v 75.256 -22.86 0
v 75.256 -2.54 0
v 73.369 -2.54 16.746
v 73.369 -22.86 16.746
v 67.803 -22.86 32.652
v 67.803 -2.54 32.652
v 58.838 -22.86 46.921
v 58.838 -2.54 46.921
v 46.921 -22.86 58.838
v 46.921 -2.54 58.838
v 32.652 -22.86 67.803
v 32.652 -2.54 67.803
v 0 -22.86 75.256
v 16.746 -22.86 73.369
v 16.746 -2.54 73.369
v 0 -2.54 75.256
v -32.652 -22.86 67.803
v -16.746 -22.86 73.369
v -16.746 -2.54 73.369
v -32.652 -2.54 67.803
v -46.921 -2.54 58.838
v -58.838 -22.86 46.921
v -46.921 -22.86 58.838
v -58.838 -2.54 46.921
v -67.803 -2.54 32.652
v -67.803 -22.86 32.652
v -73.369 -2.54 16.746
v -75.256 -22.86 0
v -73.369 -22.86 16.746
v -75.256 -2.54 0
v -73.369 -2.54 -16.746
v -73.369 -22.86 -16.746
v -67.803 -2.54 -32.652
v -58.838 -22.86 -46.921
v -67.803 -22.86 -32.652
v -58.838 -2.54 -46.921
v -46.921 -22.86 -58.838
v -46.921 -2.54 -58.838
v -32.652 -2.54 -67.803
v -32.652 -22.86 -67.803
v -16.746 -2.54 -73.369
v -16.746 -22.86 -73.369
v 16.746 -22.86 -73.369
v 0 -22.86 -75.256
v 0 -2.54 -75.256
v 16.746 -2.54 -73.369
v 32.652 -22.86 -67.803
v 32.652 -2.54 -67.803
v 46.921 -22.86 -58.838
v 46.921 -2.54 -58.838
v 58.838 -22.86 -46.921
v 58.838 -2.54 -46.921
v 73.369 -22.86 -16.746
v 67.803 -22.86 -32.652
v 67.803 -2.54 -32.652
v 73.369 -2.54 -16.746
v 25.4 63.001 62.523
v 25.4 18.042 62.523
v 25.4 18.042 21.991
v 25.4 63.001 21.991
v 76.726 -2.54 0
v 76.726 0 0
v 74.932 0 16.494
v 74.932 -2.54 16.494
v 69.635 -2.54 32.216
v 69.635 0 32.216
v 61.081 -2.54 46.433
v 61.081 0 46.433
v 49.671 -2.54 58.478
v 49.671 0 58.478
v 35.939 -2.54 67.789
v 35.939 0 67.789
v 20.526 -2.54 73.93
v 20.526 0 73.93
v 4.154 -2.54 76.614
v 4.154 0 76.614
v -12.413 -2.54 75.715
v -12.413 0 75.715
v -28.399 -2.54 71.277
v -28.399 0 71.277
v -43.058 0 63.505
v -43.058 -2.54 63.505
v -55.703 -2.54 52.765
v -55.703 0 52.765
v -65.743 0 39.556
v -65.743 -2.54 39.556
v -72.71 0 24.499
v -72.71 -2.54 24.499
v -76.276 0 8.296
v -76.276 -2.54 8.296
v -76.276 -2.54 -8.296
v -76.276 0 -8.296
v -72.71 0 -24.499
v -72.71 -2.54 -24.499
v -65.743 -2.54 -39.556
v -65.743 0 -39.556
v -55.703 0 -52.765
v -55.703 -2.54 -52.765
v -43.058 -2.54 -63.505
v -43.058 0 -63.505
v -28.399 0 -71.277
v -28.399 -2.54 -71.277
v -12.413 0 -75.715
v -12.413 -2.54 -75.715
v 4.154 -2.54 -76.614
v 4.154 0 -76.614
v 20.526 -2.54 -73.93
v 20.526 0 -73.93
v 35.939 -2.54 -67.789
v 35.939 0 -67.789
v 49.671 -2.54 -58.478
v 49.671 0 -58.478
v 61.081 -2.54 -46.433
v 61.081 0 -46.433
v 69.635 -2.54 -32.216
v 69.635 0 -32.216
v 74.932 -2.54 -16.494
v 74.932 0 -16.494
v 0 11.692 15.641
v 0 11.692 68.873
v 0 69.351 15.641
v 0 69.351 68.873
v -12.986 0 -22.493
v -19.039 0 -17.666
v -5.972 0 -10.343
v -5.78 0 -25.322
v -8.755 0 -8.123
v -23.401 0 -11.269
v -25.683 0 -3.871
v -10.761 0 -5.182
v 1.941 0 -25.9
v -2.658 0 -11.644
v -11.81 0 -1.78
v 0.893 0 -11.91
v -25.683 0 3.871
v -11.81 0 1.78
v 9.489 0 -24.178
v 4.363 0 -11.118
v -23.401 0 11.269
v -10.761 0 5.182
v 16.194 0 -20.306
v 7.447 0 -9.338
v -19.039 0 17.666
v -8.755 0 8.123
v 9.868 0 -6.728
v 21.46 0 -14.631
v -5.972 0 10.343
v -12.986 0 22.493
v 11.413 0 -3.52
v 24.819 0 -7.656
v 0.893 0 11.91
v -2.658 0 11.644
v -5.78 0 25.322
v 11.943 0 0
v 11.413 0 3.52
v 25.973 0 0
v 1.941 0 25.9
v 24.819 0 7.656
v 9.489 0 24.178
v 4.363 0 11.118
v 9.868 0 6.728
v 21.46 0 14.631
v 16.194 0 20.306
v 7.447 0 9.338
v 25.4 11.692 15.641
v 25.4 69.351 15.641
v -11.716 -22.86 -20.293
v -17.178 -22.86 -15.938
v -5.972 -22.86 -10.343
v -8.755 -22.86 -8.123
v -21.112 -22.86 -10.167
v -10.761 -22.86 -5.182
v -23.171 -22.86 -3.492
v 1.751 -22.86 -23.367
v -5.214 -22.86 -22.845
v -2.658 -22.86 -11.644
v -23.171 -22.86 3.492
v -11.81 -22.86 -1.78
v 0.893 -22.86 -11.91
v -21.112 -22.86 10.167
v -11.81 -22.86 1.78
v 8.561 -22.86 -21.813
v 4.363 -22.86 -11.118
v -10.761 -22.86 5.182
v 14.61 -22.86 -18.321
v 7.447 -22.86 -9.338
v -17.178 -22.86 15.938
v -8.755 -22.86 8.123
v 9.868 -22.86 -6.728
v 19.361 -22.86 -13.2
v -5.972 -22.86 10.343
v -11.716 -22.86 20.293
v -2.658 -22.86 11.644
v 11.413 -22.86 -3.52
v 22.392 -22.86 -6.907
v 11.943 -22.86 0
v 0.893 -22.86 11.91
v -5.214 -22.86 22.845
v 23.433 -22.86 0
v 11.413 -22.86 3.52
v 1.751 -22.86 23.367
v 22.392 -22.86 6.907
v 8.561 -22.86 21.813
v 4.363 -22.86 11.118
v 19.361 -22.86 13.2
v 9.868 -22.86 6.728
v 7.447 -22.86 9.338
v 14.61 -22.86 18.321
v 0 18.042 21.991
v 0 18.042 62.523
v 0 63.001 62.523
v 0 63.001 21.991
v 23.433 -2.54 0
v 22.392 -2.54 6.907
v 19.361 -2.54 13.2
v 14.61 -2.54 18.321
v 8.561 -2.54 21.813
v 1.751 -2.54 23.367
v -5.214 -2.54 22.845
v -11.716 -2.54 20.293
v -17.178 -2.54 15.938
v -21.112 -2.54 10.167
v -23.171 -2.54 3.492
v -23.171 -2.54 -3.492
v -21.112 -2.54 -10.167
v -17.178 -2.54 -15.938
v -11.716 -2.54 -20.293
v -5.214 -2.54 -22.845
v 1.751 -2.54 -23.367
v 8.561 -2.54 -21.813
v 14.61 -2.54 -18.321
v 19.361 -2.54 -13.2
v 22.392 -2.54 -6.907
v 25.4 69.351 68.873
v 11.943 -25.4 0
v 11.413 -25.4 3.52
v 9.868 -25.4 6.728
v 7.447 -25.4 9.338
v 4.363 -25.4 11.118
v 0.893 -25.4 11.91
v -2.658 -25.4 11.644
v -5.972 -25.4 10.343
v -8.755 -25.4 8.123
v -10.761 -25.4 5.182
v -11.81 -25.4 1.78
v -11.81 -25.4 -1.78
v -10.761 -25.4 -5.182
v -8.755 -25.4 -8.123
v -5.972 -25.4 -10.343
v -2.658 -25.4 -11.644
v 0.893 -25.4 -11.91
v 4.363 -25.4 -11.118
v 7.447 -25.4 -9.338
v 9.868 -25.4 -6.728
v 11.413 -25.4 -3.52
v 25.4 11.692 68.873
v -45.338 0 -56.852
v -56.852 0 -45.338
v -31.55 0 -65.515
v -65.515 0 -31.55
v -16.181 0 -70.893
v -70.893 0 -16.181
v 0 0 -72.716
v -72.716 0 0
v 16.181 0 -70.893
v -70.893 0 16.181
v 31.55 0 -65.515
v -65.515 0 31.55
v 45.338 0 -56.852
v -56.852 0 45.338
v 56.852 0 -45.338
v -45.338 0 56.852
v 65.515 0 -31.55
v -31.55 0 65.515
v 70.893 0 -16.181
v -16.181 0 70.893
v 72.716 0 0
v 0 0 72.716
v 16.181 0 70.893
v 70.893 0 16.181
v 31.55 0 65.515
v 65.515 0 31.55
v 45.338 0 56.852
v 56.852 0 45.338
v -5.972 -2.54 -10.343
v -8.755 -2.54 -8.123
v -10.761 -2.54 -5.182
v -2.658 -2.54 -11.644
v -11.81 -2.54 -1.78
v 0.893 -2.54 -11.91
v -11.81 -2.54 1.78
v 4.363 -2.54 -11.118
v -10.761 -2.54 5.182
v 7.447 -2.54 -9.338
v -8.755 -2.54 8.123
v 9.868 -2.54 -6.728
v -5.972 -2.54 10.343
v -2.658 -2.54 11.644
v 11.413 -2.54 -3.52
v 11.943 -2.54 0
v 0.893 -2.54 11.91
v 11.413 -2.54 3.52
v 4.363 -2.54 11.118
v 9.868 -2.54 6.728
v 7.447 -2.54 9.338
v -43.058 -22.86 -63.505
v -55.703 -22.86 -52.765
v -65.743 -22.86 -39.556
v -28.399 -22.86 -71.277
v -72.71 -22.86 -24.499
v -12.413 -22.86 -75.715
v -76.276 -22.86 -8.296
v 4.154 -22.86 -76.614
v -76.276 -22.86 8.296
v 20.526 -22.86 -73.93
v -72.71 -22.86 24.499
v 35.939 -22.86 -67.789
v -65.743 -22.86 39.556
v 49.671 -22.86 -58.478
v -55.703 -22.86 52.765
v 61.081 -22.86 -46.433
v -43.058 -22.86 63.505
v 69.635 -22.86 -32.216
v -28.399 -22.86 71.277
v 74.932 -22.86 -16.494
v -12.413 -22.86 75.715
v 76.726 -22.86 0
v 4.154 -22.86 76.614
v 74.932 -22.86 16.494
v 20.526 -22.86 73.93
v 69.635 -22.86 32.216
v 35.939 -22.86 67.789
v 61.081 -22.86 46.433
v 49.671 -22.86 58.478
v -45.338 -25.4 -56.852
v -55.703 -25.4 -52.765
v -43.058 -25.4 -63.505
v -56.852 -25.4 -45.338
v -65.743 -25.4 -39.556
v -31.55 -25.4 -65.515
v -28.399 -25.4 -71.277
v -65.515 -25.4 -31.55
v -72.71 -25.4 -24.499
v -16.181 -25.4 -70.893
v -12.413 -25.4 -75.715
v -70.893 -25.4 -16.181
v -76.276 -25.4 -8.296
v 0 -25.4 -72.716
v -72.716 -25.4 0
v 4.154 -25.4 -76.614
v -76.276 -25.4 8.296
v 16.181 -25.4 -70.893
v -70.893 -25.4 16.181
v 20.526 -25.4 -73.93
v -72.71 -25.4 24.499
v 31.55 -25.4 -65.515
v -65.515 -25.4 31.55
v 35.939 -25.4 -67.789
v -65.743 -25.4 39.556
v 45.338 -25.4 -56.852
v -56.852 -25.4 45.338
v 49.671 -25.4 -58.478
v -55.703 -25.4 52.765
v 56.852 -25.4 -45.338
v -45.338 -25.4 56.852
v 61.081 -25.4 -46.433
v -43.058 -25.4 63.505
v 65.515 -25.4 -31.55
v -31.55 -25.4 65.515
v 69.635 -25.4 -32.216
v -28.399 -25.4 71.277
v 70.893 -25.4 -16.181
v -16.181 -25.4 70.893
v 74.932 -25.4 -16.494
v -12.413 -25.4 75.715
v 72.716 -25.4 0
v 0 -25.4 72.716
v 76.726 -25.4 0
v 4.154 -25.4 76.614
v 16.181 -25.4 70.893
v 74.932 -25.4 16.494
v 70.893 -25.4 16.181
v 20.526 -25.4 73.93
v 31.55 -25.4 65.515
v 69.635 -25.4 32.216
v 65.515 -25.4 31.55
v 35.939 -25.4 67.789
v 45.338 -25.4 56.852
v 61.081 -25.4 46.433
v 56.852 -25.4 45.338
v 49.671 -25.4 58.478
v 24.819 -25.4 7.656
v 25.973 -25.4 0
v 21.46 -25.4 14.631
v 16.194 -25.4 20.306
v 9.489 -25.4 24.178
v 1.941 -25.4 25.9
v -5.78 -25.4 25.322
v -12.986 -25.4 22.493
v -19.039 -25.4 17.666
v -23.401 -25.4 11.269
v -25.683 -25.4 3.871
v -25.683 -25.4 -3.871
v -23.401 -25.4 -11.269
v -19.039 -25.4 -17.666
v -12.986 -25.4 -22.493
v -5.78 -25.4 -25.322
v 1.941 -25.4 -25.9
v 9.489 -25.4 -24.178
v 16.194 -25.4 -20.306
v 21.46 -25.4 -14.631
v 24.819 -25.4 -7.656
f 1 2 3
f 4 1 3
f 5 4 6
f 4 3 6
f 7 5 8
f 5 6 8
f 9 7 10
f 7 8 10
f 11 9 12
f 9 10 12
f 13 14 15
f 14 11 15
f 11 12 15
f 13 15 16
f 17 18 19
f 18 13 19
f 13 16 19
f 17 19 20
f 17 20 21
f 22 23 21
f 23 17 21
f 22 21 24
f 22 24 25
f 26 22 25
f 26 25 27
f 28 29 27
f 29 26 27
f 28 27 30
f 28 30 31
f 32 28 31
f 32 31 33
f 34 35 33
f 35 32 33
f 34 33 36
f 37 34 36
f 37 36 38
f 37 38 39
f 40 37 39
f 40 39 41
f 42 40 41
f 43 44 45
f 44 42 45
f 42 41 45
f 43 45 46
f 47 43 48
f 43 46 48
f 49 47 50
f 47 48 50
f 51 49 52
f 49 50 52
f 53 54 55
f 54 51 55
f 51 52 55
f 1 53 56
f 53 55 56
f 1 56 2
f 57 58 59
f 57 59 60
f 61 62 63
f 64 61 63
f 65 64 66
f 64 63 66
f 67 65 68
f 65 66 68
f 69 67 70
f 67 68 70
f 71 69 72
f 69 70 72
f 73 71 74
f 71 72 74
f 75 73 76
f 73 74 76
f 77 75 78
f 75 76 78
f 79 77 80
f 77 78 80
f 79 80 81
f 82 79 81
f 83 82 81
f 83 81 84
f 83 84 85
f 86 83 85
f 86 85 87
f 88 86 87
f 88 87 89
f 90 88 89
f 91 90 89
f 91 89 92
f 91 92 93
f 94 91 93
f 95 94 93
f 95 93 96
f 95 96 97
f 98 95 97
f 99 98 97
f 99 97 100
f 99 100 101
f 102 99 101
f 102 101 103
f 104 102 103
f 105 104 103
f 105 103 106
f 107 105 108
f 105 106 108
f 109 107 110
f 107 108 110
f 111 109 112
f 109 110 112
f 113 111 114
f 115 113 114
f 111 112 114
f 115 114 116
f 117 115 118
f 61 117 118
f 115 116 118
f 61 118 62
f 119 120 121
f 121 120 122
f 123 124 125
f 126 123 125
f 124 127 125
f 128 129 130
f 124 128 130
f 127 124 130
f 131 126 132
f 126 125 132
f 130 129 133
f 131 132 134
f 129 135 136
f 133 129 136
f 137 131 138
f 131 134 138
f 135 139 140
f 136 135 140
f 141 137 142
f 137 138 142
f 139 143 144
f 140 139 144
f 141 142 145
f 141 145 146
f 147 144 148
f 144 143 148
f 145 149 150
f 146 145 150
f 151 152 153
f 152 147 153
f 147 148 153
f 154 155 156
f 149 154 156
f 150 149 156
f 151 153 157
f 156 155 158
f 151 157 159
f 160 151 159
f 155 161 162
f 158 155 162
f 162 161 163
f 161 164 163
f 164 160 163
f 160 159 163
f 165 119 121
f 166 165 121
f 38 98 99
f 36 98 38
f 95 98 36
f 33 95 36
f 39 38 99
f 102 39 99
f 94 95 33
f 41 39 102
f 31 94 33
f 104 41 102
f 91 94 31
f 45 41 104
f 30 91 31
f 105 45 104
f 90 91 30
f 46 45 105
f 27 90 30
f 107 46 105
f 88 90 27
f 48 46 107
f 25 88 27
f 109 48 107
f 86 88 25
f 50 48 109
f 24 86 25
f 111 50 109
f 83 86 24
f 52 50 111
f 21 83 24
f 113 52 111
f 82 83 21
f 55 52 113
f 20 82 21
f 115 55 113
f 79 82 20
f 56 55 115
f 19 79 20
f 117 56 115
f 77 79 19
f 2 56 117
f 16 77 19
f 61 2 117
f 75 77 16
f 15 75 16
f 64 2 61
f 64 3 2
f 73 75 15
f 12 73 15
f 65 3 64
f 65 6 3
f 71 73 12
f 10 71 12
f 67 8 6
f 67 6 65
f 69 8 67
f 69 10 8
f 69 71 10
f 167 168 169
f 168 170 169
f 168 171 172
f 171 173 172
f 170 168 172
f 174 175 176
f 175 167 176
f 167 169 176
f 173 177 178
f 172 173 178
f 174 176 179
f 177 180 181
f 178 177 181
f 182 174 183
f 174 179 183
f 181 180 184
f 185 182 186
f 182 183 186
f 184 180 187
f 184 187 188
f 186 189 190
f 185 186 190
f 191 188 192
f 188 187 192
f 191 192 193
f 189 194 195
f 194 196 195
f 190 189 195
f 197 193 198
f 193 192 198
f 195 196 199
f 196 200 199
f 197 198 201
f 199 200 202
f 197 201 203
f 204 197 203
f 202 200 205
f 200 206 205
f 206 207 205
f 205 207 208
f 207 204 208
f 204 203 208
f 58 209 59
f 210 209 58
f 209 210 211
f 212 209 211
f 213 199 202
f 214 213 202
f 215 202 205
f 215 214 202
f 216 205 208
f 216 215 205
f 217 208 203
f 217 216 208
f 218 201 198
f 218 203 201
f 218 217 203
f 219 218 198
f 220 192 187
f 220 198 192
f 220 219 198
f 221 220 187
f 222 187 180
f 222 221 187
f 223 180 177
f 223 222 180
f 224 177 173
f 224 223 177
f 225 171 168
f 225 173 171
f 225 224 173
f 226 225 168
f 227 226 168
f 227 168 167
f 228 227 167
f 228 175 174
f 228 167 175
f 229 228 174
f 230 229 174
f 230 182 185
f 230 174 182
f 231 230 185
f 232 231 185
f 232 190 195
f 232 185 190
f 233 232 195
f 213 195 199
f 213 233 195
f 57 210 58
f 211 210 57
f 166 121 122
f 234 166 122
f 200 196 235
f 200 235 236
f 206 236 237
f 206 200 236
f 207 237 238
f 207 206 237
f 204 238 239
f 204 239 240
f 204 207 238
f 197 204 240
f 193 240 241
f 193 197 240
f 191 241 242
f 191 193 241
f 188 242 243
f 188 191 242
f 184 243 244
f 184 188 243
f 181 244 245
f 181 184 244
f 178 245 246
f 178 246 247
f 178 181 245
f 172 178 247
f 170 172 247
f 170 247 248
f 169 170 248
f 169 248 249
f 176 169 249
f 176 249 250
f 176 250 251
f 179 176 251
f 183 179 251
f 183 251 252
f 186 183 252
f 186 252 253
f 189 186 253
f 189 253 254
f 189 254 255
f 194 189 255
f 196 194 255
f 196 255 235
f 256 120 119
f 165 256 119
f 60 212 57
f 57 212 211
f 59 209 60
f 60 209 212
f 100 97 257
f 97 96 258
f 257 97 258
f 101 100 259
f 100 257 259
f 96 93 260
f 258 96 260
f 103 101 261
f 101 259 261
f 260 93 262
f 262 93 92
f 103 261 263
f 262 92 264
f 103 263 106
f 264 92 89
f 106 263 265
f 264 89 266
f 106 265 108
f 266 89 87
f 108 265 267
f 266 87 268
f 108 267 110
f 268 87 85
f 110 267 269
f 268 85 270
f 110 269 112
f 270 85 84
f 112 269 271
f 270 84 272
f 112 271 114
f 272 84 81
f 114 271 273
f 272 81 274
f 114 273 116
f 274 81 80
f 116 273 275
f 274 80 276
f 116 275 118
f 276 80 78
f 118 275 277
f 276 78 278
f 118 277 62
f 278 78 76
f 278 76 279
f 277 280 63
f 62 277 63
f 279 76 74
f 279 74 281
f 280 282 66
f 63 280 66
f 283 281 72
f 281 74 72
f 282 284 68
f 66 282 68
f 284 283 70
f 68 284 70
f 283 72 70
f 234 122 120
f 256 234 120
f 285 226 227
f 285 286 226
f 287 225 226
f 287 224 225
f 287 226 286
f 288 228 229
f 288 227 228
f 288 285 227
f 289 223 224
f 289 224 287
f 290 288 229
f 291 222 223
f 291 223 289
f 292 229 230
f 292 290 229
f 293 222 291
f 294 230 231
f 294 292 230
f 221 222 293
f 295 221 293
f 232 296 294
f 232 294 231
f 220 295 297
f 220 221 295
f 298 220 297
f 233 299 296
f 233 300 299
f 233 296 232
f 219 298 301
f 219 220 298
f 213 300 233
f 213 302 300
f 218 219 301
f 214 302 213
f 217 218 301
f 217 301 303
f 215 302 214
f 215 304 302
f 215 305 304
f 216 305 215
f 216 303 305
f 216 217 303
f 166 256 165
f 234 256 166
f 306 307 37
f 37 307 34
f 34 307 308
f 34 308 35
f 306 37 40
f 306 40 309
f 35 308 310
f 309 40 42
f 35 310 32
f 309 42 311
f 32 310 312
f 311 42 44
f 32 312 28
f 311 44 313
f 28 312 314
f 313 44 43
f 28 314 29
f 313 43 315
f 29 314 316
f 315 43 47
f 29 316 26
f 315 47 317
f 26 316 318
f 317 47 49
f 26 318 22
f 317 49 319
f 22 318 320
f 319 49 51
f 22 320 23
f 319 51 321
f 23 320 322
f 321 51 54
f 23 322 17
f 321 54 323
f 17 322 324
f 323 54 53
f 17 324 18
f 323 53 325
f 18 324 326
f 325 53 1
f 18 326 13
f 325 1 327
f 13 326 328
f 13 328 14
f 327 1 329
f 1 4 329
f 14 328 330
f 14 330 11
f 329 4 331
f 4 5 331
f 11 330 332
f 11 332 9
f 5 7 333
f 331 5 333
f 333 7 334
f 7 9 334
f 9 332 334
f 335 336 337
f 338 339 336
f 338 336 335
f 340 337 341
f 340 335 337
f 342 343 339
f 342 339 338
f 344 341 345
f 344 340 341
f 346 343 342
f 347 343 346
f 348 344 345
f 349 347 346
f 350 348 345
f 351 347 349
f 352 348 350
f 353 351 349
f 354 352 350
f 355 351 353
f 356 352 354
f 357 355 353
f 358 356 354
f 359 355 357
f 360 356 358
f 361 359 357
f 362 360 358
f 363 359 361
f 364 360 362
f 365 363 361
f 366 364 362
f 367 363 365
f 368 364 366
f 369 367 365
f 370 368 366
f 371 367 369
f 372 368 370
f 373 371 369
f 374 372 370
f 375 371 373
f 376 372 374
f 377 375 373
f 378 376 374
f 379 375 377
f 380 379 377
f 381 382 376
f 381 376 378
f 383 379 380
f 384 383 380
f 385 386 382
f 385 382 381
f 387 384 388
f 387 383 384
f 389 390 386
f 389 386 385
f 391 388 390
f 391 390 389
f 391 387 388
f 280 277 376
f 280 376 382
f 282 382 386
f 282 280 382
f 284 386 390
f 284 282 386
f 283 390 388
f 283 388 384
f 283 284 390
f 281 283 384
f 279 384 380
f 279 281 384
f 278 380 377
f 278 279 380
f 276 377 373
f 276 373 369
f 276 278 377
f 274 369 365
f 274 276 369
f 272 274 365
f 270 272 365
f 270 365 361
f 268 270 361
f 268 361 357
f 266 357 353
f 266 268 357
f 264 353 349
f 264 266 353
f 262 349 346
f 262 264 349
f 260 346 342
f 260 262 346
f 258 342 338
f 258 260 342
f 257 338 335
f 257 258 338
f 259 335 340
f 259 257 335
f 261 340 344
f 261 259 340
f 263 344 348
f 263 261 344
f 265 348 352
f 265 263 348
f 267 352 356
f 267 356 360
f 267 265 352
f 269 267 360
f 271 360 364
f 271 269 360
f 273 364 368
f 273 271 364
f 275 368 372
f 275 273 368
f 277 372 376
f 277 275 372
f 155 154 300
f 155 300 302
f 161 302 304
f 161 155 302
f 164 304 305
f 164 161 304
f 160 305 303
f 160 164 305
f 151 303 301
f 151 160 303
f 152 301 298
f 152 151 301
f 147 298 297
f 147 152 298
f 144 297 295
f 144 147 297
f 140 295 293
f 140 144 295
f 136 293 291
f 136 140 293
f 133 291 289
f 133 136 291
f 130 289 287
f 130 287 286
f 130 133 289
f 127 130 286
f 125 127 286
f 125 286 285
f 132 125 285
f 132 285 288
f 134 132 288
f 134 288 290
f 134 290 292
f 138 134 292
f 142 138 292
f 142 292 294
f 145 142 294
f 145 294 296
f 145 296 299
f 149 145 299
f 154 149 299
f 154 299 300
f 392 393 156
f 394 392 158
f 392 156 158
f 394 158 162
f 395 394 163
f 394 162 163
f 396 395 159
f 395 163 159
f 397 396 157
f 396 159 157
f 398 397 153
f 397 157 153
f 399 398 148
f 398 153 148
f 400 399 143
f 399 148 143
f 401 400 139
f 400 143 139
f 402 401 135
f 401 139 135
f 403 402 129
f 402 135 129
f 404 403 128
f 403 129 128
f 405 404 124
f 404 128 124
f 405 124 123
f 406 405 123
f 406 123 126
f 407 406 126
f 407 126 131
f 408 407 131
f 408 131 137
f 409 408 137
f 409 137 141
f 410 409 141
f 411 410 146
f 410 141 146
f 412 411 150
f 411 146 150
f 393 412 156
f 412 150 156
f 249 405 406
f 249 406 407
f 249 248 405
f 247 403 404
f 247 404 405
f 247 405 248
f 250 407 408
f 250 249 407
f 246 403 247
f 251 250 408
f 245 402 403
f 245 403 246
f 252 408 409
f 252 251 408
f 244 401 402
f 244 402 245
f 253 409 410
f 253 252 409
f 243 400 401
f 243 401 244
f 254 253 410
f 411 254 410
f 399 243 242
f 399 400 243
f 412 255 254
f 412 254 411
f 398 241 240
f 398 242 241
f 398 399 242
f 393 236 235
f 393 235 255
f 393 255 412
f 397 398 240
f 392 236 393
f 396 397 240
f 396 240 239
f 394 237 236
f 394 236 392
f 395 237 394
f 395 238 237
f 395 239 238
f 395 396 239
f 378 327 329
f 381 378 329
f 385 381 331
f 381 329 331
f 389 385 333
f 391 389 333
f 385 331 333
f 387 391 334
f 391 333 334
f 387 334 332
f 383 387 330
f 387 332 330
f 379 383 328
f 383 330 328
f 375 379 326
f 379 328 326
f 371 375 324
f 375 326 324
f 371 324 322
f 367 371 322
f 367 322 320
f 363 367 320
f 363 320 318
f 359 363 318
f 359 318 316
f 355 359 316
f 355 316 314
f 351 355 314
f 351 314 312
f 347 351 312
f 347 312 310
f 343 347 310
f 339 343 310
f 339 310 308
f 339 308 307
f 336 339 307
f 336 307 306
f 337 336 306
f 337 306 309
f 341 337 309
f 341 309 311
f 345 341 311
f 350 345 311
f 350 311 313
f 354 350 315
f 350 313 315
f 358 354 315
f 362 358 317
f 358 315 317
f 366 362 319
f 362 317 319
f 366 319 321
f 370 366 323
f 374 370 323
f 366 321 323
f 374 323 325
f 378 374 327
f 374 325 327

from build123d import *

# Parameters (mm, degrees)
F0_R     = 76.726188476
F0_R_2   = 72.7161920424
F1_DEPTH = 25.4
F0_R_3   = 25.9729126844
F0_R_4   = 11.9432833283
F2_T     = -2.54
F3_T     = -2.54
F7_DEPTH = 25.4
F6_W     = 44.9599027634
F6_H     = 40.532708168


with BuildPart() as f1:
    # F0 (on Front) → F1 (new body)
    with BuildSketch(Plane.XZ):
        Circle(F0_R)
        Circle(F0_R_2, mode=Mode.SUBTRACT)
    extrude(amount=F1_DEPTH)

    # F2
    f2_openings = [f1.faces().sort_by_distance(p)[0] for p in [
        (-76.726188, -12.7, 0),
    ]]
    offset(amount=F2_T, openings=f2_openings)


with BuildPart() as f1b:
    # F0 (on Front) → F1, piece 2 (new body)
    with BuildSketch(Plane.XZ):
        Circle(F0_R_3)
        Circle(F0_R_4, mode=Mode.SUBTRACT)
    extrude(amount=F1_DEPTH)

    # F3
    f3_openings = [f1b.faces().sort_by_distance(p)[0] for p in [
        (-11.943283, -12.7, 0),
    ]]
    offset(amount=F3_T, openings=f3_openings)


with BuildPart() as f7:
    # F5 (on Right) → F7 (new body)
    with BuildSketch(Plane.YZ):
        Polygon((11.6915064096, 15.6407313585), (69.351409173, 15.6407313585), (69.351409173, 68.8734395266), (11.6915064096, 68.8734395266), (11.6915064096, 41.7400859296), align=None)
    extrude(amount=F7_DEPTH)


with BuildPart() as f7b:
    # F6 (on face) → F7, piece 2 (new body)
    with BuildSketch(Plane.YZ):
        with Locations((40.5214577913, 42.2570854425)):
            Rectangle(F6_W, F6_H)
    extrude(amount=F7_DEPTH)


solid = Compound([f1.part, f1b.part, f7.part, f7b.part])
